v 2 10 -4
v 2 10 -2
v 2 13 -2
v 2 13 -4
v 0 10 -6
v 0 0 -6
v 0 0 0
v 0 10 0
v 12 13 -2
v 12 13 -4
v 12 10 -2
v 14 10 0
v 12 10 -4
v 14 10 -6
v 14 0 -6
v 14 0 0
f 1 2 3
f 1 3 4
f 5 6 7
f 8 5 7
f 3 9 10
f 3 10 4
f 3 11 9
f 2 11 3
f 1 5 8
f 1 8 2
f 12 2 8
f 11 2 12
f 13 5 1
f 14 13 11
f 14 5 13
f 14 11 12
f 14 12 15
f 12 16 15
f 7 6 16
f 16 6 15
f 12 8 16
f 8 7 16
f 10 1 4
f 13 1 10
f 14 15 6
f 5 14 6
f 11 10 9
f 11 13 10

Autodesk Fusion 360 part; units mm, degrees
sketch "Sketch1" plane through (0, 0, 0) normal (0, 1, 0) x (1, 0, 0)
  line L0 (0, 0) -> (14, 0)
  line L1 (14, 0) -> (14, 6)
  line L2 (14, 6) -> (0, 6)
  line L3 (0, 6) -> (0, 0)
  dimension "d1" = 14
  dimension "d2" = 6
extrude "Extrude1" add sketch "Sketch1" along normal blind 10
sketch "Sketch2" plane through (0, 10, 0) normal (0, 1, 0) x (-1, 0, 0)
  line L0 (0, -6) -> (0, 0)
  line L1 (0, 0) -> (-14, 0)
  line L2 (-14, 0) -> (-14, -6)
  line L3 (-14, -6) -> (0, -6)
  line L4 (-2, -4) -> (-12, -4)
  line L5 (-12, -4) -> (-12, -2)
  line L6 (-12, -2) -> (-2, -2)
  line L7 (-2, -2) -> (-2, -4)
  dimension "d5" = 2
  dimension "d6" = 2
  dimension "d7" = 2
  dimension "d8" = 2
extrude "Extrude2" add sketch "Sketch2" along normal blind 3 contours L4 L5 L6 L7
